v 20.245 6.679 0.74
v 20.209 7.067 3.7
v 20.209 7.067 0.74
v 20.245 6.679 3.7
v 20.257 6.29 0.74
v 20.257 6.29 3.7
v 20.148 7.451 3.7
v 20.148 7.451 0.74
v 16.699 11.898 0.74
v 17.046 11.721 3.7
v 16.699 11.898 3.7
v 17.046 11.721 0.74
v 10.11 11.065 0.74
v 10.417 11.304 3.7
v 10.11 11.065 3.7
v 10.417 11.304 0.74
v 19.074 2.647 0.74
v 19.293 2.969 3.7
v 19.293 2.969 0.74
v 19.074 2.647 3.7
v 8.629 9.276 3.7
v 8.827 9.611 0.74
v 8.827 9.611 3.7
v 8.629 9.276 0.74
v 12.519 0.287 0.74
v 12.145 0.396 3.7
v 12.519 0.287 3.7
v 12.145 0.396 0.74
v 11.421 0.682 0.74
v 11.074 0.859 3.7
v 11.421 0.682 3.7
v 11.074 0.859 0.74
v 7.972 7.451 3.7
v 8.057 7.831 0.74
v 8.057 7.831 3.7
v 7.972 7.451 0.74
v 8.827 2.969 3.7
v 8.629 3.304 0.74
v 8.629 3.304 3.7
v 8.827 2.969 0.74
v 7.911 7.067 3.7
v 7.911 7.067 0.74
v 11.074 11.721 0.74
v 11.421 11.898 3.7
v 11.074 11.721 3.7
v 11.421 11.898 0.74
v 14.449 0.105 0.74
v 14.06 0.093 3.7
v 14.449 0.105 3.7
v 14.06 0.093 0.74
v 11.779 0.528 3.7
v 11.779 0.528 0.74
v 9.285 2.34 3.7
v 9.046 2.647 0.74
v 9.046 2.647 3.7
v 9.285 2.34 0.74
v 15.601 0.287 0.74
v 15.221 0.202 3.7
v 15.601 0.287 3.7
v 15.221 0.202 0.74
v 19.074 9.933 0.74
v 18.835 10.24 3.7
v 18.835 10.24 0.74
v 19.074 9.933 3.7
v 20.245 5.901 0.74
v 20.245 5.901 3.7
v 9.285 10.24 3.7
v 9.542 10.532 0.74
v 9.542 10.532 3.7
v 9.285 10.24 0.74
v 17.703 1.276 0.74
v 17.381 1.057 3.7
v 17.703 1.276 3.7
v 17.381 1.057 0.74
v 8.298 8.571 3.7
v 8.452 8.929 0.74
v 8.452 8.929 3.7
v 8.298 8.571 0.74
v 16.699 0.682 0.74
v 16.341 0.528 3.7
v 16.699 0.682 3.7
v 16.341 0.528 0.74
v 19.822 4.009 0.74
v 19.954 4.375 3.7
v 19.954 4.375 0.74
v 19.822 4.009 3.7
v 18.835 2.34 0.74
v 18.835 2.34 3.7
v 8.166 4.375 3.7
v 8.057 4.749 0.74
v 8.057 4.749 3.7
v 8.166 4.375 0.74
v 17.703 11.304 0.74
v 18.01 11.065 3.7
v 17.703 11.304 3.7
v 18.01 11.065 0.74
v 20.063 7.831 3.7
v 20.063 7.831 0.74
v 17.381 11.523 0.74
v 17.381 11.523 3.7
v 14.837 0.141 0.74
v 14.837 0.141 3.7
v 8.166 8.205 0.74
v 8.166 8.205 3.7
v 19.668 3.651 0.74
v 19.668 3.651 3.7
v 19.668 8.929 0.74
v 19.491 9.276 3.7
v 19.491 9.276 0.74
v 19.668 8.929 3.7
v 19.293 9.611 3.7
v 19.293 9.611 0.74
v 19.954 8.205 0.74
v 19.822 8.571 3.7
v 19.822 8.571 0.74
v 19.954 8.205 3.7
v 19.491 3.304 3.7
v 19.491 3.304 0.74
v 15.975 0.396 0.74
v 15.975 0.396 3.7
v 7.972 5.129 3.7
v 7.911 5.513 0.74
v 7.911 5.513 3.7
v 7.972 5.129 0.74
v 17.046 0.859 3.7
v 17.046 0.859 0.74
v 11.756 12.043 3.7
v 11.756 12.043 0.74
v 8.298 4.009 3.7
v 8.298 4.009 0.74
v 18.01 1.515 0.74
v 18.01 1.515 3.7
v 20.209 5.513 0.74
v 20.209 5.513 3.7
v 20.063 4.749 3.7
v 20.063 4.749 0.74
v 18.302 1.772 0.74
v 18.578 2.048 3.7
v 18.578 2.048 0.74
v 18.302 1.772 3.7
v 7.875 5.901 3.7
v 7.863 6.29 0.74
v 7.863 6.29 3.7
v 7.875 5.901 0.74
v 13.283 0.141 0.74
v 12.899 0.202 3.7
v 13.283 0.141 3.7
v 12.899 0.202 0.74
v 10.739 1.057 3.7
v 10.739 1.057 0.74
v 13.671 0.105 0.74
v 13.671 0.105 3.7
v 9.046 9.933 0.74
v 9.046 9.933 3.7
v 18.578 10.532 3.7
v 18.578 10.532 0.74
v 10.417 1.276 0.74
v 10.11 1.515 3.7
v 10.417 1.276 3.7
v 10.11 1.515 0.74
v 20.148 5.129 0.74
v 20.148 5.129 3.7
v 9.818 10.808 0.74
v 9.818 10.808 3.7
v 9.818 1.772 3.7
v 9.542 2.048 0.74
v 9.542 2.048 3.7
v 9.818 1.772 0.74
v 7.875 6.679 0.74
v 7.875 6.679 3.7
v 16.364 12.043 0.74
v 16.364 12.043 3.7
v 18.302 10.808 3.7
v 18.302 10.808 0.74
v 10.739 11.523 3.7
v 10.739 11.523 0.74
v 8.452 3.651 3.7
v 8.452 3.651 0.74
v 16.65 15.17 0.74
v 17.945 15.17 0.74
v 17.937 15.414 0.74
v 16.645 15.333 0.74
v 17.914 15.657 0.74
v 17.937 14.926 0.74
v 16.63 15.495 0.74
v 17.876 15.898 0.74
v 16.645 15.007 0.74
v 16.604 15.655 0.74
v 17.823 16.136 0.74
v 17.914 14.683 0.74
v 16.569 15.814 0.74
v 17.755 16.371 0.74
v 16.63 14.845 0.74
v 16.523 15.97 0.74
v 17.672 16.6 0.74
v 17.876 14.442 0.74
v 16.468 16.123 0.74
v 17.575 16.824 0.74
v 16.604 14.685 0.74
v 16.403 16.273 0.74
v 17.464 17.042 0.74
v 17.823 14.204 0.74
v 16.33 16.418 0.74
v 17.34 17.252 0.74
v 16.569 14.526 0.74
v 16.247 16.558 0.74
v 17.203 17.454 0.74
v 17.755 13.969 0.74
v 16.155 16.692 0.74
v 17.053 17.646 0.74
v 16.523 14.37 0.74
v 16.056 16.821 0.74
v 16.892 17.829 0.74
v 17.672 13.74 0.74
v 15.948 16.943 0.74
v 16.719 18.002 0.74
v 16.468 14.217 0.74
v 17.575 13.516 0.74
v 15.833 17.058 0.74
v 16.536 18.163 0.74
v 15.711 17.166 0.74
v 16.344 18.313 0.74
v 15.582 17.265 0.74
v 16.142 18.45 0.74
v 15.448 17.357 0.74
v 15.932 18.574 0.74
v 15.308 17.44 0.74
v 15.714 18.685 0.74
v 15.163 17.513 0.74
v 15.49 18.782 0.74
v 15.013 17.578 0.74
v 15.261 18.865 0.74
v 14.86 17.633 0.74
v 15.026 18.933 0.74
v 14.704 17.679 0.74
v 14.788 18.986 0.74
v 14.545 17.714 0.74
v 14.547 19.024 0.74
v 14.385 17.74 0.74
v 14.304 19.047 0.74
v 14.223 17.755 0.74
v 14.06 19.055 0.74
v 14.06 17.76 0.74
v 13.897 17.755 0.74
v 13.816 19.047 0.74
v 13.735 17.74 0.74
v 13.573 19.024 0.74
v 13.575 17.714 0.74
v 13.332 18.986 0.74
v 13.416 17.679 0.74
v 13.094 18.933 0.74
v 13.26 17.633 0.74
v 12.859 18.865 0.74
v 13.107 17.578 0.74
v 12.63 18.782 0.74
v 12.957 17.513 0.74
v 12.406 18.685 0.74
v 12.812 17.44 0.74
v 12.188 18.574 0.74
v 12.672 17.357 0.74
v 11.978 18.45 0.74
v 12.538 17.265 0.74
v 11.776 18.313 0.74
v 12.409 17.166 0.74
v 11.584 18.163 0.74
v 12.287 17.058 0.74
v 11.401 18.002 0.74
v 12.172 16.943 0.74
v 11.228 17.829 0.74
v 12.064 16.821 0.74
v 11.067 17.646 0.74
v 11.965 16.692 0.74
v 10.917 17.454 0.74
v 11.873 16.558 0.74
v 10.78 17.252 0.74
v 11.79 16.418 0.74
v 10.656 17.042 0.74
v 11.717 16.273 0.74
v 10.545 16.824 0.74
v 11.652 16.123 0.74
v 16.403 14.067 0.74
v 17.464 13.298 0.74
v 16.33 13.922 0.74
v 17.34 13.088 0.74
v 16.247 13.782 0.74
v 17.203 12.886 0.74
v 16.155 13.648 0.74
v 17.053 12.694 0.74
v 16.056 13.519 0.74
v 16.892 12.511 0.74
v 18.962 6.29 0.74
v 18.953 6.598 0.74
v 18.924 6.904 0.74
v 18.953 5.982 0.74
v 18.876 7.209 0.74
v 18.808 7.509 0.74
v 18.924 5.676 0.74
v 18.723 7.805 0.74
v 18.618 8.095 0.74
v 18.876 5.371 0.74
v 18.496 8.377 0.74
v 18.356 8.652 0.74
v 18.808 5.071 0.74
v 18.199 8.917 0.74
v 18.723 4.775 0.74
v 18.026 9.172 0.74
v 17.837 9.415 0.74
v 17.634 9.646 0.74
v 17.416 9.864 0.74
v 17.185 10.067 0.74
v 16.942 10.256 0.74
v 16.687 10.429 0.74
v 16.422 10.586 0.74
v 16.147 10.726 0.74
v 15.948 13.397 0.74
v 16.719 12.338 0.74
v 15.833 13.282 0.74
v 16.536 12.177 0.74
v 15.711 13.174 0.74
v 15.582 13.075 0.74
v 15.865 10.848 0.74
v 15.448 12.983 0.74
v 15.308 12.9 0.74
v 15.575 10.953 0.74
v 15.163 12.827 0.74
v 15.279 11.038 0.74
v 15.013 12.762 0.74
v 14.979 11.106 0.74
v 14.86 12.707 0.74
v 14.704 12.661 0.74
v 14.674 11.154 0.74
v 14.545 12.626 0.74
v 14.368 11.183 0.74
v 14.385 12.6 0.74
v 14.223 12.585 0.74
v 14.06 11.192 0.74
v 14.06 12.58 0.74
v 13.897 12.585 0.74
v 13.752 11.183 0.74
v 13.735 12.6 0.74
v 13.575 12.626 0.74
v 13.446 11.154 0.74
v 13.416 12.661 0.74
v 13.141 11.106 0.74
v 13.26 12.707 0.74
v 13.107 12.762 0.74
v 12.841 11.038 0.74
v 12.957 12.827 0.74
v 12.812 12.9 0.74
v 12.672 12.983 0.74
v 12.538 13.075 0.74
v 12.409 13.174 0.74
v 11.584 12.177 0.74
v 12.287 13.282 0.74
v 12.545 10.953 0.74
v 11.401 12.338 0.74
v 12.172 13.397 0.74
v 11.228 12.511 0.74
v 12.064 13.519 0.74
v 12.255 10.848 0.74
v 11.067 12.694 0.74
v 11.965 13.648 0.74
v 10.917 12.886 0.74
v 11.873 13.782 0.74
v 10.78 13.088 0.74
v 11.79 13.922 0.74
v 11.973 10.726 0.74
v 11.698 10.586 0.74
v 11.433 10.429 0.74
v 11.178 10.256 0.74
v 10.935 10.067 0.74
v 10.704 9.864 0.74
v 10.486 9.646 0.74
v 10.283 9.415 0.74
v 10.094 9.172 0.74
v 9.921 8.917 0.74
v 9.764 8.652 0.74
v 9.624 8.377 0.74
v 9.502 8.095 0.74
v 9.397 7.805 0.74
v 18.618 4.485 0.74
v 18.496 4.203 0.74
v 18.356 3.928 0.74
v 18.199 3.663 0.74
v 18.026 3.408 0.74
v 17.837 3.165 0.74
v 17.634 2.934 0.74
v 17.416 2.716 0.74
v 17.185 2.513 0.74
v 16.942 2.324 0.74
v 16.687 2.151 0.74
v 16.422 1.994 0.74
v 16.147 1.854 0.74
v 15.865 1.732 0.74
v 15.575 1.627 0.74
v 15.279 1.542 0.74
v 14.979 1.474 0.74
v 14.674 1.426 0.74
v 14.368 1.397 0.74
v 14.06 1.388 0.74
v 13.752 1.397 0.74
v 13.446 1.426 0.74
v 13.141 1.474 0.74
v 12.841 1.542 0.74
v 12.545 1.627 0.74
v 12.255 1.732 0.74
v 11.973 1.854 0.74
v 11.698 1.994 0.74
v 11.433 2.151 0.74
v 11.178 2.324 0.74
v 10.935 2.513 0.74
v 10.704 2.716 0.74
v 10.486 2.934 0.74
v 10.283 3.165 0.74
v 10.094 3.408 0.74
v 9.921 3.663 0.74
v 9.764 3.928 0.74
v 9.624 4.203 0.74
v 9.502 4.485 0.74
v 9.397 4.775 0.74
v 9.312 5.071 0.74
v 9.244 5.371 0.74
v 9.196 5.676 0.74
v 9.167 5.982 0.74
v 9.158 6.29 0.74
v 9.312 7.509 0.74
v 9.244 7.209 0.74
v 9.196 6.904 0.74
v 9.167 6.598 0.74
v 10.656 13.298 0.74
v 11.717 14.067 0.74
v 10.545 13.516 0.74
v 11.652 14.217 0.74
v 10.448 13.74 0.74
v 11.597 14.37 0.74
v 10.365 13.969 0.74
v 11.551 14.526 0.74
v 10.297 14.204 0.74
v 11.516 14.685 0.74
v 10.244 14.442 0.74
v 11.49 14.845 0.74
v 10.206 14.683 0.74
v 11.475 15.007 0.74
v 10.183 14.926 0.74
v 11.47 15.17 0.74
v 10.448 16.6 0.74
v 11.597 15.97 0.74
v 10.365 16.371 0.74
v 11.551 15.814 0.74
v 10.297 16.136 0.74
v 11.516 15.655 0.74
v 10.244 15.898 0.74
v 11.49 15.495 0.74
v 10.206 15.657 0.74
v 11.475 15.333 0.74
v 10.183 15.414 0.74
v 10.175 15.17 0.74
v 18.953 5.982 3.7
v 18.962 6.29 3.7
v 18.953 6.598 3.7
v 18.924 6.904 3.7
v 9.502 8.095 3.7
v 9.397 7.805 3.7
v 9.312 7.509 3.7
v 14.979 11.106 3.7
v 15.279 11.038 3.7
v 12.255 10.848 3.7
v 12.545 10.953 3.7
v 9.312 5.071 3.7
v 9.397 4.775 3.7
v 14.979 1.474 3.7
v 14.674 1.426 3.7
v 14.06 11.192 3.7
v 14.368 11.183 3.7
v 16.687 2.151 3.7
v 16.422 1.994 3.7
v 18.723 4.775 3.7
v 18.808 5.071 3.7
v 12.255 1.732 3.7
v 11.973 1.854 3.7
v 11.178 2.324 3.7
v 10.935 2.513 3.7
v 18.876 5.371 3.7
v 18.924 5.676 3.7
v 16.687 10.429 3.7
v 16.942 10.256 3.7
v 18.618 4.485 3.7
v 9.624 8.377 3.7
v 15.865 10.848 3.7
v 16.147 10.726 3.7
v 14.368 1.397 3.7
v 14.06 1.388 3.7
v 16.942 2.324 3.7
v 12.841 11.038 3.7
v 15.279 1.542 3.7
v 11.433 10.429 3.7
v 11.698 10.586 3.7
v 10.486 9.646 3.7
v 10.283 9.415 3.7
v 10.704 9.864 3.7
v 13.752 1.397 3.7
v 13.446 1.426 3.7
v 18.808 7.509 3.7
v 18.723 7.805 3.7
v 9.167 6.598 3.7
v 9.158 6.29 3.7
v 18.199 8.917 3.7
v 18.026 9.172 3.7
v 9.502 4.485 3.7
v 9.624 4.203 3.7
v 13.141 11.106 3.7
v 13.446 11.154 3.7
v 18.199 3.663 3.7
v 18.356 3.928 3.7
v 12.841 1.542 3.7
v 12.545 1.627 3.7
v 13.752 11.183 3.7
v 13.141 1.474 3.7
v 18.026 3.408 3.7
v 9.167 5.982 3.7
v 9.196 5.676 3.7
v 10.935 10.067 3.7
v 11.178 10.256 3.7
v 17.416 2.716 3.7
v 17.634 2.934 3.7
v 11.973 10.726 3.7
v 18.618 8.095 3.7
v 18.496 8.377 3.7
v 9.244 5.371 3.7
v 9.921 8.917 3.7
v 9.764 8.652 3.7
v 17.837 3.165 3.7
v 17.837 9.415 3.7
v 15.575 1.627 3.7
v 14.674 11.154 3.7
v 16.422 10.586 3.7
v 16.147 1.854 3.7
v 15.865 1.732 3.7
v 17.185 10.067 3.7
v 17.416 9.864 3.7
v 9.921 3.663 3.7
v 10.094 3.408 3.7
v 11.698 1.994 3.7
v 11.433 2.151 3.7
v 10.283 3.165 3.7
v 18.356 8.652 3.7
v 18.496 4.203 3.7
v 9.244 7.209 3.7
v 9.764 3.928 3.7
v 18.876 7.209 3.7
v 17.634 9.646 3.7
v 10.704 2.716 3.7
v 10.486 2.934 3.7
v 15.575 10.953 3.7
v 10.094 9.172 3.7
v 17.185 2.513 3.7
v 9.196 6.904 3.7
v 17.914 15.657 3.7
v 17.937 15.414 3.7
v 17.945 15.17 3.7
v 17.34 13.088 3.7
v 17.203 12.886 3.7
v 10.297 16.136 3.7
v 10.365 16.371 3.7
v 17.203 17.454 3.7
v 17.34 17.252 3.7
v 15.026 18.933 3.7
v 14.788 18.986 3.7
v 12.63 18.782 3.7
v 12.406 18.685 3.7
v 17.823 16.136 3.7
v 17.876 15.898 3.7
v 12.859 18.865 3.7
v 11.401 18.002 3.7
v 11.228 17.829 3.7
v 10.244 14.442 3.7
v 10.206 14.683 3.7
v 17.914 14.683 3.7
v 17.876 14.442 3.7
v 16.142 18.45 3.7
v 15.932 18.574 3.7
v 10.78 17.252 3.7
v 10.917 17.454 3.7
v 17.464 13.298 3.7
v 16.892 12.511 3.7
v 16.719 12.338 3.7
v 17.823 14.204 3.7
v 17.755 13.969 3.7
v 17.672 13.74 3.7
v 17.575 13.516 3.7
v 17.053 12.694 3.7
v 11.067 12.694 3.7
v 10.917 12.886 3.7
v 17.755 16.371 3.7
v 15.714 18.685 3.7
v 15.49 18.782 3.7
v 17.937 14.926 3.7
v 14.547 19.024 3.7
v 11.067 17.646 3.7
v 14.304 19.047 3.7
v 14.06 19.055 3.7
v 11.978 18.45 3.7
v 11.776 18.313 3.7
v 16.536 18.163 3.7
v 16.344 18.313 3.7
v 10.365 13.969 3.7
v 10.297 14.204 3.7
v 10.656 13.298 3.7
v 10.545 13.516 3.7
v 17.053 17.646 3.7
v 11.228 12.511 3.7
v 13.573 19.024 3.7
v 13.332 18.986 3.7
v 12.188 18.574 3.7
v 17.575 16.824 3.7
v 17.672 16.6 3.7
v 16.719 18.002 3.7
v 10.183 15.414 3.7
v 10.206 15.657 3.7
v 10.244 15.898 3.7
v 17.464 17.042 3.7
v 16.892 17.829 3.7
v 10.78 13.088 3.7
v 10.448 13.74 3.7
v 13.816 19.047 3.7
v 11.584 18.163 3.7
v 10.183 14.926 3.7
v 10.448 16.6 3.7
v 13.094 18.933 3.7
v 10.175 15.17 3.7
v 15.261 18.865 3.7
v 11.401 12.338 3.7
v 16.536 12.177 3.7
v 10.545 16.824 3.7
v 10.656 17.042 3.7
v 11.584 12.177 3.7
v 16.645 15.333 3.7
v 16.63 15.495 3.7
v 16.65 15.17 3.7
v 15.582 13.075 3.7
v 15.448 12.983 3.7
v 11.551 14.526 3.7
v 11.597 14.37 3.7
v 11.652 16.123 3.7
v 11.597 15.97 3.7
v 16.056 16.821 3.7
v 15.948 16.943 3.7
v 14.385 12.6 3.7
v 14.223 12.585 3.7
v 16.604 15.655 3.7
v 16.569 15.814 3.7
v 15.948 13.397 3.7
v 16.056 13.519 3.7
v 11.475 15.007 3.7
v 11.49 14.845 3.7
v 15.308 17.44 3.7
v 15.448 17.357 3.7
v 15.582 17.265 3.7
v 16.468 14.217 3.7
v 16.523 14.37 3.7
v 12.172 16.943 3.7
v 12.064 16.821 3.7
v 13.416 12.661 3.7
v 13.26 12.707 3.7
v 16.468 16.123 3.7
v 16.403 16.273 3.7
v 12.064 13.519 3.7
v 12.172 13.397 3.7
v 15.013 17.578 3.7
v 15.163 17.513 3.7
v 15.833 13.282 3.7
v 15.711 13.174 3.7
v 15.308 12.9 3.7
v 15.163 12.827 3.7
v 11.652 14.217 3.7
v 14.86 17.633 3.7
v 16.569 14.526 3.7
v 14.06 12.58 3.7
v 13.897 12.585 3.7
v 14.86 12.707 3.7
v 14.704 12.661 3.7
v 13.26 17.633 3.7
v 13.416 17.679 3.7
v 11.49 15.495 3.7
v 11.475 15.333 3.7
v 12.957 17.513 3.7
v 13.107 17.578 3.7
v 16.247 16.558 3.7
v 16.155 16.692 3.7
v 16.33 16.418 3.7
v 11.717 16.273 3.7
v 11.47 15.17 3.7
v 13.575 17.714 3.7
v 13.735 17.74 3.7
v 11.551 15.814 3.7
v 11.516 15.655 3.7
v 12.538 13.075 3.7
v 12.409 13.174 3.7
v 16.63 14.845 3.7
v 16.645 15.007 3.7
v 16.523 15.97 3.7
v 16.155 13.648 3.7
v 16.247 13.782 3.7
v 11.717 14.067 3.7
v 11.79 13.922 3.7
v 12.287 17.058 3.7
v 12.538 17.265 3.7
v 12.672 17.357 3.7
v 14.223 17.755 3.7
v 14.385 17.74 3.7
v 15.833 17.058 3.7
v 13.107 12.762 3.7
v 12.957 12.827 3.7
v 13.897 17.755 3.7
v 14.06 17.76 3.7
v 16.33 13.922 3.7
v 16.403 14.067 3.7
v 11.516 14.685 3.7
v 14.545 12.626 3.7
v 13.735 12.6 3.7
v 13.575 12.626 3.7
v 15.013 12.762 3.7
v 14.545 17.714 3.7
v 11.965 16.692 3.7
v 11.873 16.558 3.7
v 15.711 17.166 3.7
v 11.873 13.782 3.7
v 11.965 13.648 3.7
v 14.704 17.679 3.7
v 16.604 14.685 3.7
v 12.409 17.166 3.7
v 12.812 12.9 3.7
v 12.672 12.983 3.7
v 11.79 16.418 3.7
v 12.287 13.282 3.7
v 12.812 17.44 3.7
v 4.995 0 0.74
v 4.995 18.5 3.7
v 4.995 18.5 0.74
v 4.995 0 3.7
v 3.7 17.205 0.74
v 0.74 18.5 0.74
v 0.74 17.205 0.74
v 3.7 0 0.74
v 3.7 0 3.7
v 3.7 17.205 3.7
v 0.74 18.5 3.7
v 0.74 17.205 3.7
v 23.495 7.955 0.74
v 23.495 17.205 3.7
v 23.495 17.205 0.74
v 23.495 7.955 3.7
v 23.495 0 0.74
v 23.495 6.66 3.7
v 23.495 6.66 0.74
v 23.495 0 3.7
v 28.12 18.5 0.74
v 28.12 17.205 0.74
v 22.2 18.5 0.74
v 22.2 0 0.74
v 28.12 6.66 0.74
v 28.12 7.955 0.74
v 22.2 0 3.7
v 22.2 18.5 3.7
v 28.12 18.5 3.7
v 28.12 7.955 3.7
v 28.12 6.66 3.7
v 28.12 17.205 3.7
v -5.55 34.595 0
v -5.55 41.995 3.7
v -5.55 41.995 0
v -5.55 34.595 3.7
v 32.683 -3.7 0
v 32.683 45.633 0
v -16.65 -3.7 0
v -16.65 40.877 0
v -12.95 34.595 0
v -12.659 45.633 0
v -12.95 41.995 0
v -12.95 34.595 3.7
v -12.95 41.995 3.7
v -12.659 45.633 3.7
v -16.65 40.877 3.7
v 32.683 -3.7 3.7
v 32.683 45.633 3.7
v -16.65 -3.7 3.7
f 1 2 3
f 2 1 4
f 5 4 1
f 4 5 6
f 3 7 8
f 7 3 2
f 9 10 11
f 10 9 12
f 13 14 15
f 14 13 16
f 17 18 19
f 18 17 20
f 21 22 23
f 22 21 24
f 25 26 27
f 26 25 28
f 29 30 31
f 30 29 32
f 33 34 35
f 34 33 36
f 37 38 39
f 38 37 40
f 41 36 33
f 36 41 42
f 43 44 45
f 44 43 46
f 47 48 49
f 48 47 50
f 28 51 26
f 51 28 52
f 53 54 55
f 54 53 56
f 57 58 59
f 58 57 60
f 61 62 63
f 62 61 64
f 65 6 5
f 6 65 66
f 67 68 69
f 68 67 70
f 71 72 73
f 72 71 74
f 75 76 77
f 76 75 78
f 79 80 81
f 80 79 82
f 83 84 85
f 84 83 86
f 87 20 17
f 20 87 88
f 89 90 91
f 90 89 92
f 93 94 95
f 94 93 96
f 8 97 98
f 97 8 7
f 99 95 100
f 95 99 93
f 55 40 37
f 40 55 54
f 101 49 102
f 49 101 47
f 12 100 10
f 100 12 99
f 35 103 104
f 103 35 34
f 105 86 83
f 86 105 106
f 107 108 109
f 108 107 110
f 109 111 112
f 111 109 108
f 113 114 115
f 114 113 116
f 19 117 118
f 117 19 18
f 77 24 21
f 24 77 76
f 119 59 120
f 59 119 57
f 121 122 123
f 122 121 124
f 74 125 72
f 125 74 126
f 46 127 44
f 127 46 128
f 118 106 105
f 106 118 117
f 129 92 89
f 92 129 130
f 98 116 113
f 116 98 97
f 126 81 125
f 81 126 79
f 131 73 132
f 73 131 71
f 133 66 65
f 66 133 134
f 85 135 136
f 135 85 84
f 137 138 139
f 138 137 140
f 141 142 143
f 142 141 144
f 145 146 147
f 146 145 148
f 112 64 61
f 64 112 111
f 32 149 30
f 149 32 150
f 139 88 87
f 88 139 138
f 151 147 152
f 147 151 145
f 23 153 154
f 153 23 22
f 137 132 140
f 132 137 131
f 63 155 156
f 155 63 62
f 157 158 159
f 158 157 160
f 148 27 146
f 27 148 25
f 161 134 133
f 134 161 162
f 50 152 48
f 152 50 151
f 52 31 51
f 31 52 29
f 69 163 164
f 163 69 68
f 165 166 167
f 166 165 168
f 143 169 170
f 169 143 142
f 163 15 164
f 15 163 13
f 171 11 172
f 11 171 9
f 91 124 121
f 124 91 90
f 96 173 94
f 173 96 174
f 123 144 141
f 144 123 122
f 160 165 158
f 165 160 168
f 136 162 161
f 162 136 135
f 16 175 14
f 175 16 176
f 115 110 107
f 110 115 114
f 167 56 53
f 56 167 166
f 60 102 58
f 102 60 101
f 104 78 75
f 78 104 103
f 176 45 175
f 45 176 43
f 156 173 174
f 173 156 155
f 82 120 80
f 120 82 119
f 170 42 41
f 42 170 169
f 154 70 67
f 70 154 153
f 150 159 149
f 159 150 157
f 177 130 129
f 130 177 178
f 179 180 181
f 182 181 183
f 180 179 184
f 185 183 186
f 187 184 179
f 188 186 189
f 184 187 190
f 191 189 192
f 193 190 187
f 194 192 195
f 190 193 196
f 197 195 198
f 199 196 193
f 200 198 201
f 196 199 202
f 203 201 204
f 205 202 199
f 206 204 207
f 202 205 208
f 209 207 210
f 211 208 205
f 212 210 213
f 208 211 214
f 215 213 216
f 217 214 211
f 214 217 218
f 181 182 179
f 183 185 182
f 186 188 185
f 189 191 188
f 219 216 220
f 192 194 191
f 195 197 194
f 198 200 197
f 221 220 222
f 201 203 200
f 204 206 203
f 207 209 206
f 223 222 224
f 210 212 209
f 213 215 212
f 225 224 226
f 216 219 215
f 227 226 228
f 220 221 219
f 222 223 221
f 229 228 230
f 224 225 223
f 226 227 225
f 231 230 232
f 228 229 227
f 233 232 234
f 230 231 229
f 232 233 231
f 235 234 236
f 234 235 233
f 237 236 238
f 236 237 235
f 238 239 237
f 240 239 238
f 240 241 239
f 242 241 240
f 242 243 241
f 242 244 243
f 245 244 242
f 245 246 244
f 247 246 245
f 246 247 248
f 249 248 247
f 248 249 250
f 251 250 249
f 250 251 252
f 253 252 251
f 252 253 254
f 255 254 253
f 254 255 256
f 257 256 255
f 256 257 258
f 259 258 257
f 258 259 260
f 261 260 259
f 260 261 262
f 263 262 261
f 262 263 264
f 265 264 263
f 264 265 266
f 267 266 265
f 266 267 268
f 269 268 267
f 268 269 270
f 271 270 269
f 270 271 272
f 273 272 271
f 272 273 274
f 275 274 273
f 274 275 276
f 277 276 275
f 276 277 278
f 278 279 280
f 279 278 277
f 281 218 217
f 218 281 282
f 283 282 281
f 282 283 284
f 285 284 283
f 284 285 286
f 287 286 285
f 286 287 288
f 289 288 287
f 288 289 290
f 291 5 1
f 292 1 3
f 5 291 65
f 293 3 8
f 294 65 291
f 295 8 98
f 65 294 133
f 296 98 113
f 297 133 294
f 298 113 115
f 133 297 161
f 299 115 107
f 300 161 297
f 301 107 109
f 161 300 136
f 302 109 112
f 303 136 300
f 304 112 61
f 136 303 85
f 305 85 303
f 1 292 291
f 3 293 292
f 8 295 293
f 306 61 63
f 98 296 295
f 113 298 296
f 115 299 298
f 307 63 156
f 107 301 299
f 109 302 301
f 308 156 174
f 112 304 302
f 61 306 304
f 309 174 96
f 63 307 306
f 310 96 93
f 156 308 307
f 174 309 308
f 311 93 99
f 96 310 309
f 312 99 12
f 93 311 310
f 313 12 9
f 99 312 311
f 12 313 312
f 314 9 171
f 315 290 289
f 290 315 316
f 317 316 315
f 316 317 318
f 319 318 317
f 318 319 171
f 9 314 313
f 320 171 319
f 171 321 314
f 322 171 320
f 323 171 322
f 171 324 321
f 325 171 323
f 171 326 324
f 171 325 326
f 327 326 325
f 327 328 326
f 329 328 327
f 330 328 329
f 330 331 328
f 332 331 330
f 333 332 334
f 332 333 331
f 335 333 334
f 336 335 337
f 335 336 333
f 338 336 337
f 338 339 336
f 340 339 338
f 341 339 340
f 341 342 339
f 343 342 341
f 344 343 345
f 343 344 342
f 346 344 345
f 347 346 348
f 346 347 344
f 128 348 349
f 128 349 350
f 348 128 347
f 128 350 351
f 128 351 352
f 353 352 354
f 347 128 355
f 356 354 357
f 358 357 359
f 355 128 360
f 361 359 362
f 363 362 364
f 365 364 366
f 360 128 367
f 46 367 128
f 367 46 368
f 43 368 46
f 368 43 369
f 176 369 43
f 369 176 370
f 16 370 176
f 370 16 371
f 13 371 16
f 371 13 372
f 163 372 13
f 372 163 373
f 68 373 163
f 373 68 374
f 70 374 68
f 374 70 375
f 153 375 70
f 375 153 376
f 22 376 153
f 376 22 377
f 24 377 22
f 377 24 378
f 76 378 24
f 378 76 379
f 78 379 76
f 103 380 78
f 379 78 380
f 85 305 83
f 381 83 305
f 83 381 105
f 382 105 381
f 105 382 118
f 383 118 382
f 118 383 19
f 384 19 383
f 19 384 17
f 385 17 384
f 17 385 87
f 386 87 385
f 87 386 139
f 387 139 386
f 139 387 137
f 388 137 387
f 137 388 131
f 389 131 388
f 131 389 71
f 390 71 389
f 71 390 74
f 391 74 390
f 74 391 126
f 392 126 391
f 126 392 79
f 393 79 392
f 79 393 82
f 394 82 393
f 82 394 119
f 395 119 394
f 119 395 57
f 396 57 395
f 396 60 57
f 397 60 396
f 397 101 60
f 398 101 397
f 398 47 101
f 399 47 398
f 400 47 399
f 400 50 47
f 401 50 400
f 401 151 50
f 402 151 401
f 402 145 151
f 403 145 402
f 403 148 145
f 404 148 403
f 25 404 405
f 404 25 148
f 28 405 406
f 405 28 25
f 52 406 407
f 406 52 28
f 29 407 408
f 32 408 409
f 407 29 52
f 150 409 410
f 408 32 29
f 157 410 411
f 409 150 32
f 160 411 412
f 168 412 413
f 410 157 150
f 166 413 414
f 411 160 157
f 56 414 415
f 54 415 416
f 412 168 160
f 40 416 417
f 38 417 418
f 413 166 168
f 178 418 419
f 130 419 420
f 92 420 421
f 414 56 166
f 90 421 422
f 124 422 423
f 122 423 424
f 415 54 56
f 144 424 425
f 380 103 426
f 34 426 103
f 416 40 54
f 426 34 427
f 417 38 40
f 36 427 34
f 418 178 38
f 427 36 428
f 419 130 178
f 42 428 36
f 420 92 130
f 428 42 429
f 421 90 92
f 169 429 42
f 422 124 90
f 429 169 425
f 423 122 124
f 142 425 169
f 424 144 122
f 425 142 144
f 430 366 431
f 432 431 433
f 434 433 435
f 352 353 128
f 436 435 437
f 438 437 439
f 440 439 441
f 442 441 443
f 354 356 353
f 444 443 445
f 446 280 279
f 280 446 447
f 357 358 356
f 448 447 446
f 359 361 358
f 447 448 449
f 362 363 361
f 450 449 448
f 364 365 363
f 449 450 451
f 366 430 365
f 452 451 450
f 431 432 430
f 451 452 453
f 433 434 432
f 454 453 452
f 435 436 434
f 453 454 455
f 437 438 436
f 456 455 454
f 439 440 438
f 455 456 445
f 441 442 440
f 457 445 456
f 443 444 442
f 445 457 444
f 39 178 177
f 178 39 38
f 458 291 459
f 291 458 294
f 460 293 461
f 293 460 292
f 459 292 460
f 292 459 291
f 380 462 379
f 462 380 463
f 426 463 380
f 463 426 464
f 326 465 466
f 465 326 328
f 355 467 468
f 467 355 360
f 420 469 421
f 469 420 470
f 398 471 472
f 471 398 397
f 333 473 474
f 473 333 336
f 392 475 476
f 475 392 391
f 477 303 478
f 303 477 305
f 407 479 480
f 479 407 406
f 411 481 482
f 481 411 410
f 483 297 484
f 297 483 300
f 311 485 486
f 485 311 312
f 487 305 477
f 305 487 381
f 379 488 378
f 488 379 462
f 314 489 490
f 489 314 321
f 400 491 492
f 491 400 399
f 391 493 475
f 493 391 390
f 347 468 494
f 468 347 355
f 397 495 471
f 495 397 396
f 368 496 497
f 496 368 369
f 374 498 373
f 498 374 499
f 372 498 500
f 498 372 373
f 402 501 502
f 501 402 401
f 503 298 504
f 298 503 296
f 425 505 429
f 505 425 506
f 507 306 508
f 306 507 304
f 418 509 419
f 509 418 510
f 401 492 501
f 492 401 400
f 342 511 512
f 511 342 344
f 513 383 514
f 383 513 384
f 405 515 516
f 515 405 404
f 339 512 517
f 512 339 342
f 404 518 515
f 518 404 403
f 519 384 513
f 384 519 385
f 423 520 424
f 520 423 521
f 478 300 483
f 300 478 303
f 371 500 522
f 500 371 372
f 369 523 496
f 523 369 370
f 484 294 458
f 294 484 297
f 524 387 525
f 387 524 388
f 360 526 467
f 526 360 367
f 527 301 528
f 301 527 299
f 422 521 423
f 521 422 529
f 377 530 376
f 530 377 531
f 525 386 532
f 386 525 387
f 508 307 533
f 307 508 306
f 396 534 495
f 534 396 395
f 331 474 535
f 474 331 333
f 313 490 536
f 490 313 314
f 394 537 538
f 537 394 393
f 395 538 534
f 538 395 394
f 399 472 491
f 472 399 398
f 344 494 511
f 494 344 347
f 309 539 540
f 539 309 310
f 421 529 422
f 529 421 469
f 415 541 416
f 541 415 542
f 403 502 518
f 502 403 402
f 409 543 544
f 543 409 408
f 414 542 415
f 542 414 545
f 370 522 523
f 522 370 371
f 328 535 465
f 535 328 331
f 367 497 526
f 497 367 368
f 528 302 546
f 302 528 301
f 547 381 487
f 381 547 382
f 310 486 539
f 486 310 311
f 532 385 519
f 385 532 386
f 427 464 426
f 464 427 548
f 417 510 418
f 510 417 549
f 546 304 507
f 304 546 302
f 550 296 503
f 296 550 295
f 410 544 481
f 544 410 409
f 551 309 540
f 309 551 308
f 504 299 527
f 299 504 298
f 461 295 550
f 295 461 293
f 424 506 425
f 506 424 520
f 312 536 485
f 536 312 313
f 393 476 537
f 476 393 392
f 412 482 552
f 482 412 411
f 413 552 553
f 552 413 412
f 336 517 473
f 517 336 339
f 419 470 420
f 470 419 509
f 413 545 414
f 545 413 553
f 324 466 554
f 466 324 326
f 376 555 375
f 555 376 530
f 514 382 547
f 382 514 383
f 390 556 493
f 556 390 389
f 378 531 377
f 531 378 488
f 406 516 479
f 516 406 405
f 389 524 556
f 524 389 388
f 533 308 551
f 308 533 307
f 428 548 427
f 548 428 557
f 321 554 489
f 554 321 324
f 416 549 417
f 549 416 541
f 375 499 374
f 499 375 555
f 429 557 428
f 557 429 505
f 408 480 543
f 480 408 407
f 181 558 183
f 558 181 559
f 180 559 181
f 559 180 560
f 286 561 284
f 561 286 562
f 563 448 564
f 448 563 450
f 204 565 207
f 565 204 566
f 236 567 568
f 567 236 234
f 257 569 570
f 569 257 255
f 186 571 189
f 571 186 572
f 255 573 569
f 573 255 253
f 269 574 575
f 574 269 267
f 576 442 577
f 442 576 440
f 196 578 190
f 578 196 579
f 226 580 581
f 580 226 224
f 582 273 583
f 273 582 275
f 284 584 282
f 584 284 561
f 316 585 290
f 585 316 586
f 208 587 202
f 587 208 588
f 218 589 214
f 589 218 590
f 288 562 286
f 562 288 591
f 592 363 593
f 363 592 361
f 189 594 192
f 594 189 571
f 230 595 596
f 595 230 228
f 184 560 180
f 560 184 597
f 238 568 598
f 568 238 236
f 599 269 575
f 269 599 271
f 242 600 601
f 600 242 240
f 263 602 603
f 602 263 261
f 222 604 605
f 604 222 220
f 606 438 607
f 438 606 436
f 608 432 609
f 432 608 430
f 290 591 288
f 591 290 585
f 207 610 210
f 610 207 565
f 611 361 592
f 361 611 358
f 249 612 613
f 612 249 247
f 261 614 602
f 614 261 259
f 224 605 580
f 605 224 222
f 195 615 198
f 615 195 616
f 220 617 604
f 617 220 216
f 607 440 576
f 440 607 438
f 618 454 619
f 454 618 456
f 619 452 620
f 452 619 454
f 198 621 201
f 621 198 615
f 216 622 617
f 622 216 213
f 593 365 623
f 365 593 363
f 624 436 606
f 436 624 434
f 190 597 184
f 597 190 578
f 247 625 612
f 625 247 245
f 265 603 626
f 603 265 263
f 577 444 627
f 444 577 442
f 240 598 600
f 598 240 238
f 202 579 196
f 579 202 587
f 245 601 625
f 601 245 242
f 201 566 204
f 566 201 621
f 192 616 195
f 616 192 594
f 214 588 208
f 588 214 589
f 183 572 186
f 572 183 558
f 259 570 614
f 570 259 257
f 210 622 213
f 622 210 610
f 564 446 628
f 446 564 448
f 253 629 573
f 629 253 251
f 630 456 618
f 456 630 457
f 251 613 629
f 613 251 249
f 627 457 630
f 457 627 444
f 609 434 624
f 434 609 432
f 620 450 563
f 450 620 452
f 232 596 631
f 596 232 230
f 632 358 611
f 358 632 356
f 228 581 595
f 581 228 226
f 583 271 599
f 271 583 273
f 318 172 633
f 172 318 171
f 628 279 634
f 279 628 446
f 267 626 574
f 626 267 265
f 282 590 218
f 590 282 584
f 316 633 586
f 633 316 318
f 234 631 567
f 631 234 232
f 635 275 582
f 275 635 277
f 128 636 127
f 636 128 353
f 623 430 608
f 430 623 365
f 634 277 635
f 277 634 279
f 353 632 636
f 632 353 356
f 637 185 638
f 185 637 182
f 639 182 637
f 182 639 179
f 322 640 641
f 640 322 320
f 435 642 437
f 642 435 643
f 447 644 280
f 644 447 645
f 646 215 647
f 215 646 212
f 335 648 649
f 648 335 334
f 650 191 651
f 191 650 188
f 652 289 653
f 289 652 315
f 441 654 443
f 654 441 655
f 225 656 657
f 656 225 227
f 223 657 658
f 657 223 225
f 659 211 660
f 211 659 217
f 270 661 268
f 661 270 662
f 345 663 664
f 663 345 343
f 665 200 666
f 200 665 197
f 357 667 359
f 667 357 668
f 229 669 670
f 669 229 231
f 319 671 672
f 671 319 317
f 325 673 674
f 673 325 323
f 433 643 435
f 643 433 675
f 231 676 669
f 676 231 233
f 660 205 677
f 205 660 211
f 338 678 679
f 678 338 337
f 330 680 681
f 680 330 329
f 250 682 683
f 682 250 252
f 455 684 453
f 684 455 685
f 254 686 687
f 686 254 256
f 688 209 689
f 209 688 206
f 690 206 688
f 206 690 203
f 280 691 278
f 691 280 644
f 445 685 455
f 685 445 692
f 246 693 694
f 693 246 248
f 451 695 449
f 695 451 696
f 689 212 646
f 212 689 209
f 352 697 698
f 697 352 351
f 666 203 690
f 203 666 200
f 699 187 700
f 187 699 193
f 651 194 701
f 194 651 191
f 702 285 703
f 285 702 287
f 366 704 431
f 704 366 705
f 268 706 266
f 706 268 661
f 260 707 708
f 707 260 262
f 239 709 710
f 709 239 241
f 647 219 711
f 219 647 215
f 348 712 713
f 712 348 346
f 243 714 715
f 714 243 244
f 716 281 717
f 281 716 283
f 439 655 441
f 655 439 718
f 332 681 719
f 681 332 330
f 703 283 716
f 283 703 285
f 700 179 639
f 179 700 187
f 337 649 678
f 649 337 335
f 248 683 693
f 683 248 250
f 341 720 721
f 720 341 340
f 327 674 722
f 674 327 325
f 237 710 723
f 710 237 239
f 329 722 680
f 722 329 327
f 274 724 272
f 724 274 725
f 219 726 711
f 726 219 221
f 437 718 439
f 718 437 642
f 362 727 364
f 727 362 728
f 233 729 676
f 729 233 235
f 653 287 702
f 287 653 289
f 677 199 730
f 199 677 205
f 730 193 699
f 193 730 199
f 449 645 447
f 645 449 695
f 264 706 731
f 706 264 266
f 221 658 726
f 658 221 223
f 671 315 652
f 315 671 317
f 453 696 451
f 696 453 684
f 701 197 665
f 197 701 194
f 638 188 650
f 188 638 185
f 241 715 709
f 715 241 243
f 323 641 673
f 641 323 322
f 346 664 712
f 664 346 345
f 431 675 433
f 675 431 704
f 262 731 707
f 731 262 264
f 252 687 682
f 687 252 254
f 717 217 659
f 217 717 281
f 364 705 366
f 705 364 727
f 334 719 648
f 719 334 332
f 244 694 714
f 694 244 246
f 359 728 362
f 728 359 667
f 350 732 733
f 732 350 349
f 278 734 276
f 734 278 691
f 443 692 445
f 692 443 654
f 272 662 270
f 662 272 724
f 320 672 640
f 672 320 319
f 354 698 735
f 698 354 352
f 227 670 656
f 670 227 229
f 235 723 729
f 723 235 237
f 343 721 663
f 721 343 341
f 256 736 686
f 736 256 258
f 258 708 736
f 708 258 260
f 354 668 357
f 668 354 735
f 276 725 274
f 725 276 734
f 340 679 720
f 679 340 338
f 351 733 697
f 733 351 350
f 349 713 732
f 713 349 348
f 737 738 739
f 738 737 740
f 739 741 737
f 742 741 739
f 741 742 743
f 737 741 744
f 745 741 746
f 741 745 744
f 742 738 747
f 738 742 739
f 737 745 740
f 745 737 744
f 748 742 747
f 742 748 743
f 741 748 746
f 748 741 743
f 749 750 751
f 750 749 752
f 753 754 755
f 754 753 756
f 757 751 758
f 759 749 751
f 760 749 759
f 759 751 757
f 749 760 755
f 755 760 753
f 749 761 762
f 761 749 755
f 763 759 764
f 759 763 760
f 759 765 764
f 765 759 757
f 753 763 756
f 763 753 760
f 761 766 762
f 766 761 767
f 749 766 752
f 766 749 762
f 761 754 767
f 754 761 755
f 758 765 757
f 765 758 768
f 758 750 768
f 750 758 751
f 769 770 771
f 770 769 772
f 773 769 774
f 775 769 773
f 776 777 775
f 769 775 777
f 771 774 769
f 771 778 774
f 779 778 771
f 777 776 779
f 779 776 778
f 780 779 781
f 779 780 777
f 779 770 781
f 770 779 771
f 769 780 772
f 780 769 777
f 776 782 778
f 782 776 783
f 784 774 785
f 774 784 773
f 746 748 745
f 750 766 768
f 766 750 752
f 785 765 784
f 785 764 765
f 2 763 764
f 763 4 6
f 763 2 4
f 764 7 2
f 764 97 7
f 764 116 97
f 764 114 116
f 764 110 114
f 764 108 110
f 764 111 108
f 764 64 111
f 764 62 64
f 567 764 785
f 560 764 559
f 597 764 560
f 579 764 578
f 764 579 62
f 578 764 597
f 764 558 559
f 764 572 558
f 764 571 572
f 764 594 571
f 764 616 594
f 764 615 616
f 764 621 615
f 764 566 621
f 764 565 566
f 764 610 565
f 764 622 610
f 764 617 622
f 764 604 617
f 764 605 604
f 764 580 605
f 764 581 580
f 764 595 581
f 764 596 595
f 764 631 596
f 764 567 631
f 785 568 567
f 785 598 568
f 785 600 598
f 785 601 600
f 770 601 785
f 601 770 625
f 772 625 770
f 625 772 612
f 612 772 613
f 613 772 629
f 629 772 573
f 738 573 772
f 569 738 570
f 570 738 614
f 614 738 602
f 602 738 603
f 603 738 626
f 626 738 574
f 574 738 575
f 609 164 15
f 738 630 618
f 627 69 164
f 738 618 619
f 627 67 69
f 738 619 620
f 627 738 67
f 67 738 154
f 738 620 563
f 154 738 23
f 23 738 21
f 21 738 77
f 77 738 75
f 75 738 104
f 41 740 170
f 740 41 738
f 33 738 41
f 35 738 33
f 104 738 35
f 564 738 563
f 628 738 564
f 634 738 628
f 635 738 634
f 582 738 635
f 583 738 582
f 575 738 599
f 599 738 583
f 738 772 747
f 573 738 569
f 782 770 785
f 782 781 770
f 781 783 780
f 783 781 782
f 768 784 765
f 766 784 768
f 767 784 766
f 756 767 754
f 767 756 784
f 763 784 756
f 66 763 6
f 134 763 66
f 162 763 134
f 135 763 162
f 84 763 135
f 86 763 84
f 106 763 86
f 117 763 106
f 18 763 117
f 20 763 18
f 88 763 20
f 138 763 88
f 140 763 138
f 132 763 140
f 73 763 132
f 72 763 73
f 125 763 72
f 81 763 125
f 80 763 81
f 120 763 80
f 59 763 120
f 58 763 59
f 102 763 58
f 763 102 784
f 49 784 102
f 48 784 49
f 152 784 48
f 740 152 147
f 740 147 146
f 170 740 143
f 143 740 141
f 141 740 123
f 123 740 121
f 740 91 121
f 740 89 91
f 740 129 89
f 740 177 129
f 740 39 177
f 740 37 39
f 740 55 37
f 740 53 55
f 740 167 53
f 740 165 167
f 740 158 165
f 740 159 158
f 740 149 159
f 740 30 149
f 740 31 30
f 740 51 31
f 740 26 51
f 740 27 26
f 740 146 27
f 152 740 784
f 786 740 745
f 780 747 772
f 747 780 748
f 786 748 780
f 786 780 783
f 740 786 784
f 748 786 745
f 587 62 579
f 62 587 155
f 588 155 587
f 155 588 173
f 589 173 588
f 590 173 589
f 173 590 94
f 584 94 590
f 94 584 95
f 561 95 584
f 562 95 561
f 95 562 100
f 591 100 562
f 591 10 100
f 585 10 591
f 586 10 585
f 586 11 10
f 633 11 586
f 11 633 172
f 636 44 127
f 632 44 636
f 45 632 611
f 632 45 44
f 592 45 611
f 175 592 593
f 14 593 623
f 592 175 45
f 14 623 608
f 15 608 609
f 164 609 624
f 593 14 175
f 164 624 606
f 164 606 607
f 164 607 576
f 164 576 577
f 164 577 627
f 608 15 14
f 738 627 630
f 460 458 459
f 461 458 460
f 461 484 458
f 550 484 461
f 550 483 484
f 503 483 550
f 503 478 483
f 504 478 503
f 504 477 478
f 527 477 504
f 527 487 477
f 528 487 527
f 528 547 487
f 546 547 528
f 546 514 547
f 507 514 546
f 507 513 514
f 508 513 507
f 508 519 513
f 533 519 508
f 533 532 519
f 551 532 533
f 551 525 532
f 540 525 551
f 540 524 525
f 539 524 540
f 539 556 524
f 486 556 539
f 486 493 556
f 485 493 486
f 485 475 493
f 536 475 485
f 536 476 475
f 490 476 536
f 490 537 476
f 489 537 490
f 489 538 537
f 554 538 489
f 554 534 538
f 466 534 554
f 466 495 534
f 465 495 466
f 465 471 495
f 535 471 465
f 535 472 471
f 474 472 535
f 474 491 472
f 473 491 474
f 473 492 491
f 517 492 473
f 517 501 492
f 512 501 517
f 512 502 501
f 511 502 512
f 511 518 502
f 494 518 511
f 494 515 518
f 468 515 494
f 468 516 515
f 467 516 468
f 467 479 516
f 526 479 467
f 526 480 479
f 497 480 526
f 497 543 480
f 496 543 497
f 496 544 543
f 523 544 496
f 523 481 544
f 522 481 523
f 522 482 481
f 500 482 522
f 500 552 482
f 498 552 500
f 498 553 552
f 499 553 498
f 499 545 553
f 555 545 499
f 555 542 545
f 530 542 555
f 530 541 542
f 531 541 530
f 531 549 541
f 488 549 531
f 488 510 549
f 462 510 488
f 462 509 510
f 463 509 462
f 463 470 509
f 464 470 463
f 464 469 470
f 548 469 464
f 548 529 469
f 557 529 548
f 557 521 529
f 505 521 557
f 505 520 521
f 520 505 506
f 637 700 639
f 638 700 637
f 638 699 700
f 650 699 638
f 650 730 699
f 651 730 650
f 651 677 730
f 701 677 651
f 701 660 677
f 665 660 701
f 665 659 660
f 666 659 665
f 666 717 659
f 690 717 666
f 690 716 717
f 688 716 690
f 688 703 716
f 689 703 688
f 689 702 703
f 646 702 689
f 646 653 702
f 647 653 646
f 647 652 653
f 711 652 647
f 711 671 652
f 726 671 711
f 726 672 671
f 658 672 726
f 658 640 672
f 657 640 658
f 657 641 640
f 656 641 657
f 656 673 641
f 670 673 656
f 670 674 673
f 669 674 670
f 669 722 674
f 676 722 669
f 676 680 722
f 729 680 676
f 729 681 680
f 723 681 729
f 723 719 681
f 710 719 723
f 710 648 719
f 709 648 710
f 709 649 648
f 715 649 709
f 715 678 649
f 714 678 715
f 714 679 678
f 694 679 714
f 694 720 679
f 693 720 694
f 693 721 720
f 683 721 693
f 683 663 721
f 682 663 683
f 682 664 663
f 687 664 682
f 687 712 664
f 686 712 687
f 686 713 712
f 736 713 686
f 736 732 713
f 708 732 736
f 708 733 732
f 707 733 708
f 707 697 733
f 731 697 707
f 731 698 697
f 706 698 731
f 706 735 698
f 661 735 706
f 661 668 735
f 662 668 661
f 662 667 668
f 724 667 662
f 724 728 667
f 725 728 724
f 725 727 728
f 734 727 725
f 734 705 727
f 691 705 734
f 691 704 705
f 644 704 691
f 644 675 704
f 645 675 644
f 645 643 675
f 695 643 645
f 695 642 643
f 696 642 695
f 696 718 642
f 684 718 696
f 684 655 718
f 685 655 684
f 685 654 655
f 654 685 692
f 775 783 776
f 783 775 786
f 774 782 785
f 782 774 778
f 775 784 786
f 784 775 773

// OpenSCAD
$fn=100;

logo_height = 1;
box_height = 1;

module logo18F(){
    //align just to the right of the Y axis
    translate([1, 0, 0]){
        
        // make the '1'
        cube([.35, 5, logo_height]);
        translate([-.8, 4.65, 0])
            cube([.8, .35, logo_height]);
        
        // make the '8'
        translate([2.8, 1.7, 0])
            difference(){
                cylinder(h=logo_height, r=1.675);
                cylinder(h=logo_height, r=1.325);
            }
        translate([2.8, 4.1, 0])
            difference(){
                cylinder(h=logo_height, r=1.05);
                cylinder(h=logo_height, r=0.7);
            }
        
        // make the 'F'
        translate([5, 0, 0])
            cube([.35, 5, logo_height]);        
        translate([5.35, 1.8, 0])
            cube([1.25, .35, logo_height]);        
        translate([5.35, 4.65, 0])
            cube([1.25, .35, logo_height]);
    }
}

module keychain(){
    
    difference(){
        translate([-4.5, -1, 0]){
            color([0, 0, 1])
                cube([13+1/3, 13+1/3, box_height]);
        }
        
        union(){
            // remove a square in the upper left hand corner
            translate([-3.5, 9.35, 0])
                cube([2, 2, 2]);
            
        translate([-4.75, 10.75, -.5])
            rotate([0, 0, 50])
                cube([3, 2, 2]);
            
            // imprint the 18F logo
            color([1, 1, 1]){
                translate([0, 0, .2])
                    logo18F();
            }
        }
    }
}


// this scaling allows the model to be imported into shapeways in mm with a resulting size of 2' X 2'
scale([3.7, 3.7, 3.7])
     keychain();
